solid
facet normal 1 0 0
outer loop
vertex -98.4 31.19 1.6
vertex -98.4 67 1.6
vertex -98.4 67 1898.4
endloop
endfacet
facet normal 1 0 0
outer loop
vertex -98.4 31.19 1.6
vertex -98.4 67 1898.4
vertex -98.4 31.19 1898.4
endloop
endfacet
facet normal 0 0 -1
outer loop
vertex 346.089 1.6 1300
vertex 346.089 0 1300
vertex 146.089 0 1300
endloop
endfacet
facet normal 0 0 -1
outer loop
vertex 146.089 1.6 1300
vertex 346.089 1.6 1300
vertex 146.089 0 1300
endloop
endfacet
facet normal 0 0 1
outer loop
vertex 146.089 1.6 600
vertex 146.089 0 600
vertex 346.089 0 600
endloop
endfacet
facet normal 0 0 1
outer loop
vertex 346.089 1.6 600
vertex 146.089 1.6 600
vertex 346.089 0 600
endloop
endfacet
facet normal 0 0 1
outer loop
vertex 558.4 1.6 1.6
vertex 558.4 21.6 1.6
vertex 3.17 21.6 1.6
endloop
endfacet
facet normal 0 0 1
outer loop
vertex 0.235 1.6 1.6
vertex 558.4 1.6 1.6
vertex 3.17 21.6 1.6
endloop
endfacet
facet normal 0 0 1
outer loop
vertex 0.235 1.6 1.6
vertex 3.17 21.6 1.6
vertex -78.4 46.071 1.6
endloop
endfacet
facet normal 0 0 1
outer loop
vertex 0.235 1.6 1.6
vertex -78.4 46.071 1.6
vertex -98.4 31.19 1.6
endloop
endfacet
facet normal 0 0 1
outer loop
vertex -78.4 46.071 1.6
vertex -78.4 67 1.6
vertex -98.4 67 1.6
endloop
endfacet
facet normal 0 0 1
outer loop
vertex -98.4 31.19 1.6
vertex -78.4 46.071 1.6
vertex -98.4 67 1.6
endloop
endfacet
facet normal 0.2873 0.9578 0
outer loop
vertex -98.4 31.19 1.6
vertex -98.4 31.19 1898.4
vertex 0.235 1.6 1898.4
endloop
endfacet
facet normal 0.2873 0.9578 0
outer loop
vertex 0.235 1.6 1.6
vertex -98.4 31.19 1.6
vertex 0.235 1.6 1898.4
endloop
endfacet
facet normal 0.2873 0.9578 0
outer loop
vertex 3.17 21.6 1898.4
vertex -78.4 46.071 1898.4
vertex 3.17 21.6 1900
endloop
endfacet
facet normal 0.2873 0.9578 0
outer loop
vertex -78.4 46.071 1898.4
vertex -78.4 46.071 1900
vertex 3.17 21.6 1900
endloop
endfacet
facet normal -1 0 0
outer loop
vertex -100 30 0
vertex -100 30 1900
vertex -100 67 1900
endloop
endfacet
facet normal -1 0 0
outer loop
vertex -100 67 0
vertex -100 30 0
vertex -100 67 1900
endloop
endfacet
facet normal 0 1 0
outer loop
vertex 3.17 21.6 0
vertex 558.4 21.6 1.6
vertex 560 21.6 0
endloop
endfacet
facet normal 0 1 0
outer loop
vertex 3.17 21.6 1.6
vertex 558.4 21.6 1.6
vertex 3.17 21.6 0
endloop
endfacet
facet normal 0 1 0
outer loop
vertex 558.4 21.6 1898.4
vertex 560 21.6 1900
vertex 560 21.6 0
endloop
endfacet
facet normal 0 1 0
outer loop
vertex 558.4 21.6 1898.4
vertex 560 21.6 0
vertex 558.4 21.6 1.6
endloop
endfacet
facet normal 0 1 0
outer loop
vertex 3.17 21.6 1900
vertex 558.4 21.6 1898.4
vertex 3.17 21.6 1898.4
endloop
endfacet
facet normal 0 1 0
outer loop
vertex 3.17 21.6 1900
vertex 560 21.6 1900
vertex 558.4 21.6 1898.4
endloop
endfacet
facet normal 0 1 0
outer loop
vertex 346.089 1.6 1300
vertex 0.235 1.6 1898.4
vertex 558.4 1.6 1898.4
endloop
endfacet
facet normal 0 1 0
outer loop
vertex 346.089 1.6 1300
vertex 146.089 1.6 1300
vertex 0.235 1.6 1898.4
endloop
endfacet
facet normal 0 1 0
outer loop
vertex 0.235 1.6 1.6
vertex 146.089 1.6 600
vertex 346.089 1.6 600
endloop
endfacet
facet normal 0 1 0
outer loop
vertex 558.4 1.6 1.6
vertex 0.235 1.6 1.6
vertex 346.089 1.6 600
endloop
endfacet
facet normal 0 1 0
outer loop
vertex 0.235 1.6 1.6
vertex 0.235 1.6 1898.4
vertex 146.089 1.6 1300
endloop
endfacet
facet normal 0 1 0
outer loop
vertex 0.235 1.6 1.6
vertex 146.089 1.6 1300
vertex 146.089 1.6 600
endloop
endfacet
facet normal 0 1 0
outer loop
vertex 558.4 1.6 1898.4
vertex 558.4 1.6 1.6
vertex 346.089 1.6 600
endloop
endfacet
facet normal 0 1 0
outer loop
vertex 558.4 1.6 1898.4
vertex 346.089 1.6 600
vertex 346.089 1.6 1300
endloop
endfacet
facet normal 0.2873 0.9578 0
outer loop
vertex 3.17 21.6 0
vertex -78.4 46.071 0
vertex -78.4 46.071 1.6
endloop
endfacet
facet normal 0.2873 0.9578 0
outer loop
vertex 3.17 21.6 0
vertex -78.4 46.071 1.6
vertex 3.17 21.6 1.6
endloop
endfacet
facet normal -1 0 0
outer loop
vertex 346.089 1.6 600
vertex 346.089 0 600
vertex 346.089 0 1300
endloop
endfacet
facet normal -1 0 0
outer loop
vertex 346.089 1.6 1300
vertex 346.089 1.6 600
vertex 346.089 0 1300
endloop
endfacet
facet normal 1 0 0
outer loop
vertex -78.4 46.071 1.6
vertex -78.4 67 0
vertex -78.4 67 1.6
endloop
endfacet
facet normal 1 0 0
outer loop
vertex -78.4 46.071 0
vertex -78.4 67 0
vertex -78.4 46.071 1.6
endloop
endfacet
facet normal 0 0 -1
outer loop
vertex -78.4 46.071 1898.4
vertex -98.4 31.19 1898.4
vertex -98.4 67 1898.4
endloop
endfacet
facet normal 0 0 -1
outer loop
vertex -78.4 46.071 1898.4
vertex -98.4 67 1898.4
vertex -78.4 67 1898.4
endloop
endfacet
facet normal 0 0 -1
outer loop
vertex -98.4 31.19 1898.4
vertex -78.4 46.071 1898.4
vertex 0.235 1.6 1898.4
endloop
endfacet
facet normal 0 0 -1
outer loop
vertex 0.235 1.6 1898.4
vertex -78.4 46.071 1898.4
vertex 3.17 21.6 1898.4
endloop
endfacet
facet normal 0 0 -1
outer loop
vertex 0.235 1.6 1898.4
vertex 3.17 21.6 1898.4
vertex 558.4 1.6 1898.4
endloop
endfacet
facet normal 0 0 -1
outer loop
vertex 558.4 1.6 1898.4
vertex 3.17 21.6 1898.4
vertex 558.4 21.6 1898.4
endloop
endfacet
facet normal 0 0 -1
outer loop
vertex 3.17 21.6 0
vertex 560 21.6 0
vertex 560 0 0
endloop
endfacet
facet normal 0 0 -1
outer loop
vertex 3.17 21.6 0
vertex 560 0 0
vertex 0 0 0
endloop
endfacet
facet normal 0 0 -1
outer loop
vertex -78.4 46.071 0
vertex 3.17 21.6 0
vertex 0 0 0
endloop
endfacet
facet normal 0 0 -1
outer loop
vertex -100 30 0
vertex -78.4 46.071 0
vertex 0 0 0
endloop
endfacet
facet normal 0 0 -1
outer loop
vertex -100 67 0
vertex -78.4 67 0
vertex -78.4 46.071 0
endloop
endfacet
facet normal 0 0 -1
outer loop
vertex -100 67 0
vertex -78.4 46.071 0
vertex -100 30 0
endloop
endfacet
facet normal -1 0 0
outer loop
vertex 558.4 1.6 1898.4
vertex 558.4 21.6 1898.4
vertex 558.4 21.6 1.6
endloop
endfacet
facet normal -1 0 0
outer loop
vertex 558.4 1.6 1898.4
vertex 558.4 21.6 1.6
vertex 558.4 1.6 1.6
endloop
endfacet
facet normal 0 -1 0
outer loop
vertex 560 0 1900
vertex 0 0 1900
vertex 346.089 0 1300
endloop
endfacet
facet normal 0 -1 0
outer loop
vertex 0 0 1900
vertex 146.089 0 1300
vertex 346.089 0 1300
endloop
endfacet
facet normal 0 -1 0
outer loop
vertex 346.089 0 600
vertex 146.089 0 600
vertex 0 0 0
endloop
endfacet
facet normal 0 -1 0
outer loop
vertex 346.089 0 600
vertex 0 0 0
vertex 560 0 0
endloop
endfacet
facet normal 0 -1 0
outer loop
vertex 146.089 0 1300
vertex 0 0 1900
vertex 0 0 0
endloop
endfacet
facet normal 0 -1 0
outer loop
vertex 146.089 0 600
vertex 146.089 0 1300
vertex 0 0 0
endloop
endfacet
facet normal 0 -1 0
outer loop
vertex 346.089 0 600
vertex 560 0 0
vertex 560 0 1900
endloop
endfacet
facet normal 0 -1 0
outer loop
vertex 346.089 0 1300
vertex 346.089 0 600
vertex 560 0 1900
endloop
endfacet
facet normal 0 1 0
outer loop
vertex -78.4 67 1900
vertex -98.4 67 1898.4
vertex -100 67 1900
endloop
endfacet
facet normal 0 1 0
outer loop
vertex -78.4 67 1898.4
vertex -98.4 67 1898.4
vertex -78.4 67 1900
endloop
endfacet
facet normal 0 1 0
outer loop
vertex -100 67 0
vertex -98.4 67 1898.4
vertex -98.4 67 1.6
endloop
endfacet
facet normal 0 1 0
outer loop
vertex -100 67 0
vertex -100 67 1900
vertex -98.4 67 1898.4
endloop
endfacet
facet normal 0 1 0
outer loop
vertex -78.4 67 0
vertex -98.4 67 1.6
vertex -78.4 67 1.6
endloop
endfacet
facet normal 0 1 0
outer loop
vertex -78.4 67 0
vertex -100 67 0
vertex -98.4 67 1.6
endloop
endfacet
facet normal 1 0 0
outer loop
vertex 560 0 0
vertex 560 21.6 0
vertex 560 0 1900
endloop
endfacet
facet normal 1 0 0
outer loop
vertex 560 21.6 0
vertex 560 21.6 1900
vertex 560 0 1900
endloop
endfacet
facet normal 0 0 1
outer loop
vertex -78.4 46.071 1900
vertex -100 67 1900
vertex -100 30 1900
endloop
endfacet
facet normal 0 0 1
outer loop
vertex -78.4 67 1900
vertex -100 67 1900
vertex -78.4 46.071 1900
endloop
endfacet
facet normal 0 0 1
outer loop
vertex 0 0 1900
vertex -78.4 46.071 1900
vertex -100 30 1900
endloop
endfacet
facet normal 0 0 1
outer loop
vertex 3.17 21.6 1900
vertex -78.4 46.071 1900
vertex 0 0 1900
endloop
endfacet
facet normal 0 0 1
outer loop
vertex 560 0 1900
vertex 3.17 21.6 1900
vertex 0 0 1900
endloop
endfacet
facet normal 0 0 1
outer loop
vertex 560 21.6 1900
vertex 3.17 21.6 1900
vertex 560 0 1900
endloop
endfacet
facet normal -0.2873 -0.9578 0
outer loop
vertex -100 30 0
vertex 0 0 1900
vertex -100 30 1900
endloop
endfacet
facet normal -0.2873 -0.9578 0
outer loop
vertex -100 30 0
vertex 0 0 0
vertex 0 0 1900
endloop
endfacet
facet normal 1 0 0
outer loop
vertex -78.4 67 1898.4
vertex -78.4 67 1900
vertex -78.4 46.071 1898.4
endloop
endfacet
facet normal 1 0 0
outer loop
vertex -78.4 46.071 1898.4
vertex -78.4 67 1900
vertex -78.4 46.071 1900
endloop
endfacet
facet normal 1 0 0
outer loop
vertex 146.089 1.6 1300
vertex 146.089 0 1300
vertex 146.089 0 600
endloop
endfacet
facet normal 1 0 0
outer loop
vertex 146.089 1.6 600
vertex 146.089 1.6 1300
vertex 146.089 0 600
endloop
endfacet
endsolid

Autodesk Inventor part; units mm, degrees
ref_plane "YZ Plane" through (0, 0, 0) normal (1, 0, 0) x (0, 1, 0)
ref_plane "XZ Plane" through (0, 0, 0) normal (0, 1, 0) x (-1, 0, 0)
ref_plane "XY Plane" through (0, 0, 0) normal (0, 0, 1) x (1, 0, 0)
sketch "Sketch1" plane through (0, 0, 0) normal (0, 0, 1) x (1, 0, 0)
  line L0 (0, 0) -> (560, 0)
  line L1 (0, 0) -> (-100, 30)
  line L2 (0, 0) -> (104.4031, 0) construction
  line L3 (-100, 30) -> (-100, 67)
  line L4 (-98.4, 67) -> (-98.4, 31.1904)
  line L5 (-98.4, 31.1904) -> (0.2348, 1.6)
  line L6 (0.2348, 1.6) -> (560, 1.6)
  line L7 (-98.4, 67) -> (-100, 67)
  line L8 (560, 1.6) -> (560, 0)
  dimension "d0" = 560
  dimension "d2" = 100
  dimension "d3" = 37
  dimension "d9" = 30
  dimension "d10" = 1.6
extrude "Extrusion1" add sketch "Sketch1" along normal blind 1900
sketch "Sketch2" plane through (0, 0, 1900) normal (0, 0, 1) x (1, 0, 0)
  line L0 (-98.4, 31.1904) -> (-98.4, 67) projected
  line L1 (0.2348, 1.6) -> (-98.4, 31.1904) projected
  line L2 (560, 1.6) -> (0.2348, 1.6) projected
  line L3 (-78.4, 67) -> (-78.4, 46.0711)
  line L4 (-78.4, 46.0711) -> (3.1702, 21.6)
  line L5 (3.1702, 21.6) -> (560, 21.6)
  line L6 (-78.4, 67) -> (-98.4, 67)
  line L7 (560, 21.6) -> (560, 1.6)
  line L8 (560, 1.6) -> (558.4, 1.6)
  line L9 (558.4, 1.6) -> (558.4, 21.6)
  line L10 (558.4, 21.6) -> (560, 21.6)
  line L11 (560, 21.6) -> (560, 1.6)
  point P0 (0, 0)
  dimension "d11" = 20
  dimension "d16" = 1.6
  dimension "d17" = 20
extrude "Extrusion2" add sketch "Sketch2" against normal blind 1.6
sketch "Sketch3" plane through (0, 0, 0) normal (0, 0, -1) x (-1, 0, 0)
  line L0 (98.4, 67) -> (98.4, 31.1904) projected
  line L1 (98.4, 67) -> (78.4, 67) projected
  line L2 (78.4, 67) -> (78.4, 46.0711) projected
  line L3 (78.4, 46.0711) -> (-3.1702, 21.6) projected
  line L4 (-3.1702, 21.6) -> (-560, 21.6) projected
  line L5 (-560, 21.6) -> (-560, 1.6) projected
  line L6 (-0.2348, 1.6) -> (-560, 1.6) projected
  line L7 (98.4, 31.1904) -> (-0.2348, 1.6) projected
  point P0 (0, 0)
extrude "Extrusion3" add sketch "Sketch3" against normal blind 1.6
sketch "Sketch4" plane through (0, 0, 1898.4) normal (0, 0, -1) x (-1, 0, 0)
  line L0 (-560, 21.6) -> (-560, 1.6) projected
  line L1 (-560, 21.6) -> (-558.4, 21.6)
  line L2 (-558.4, 21.6) -> (-558.4, 1.6)
  line L3 (-558.4, 1.6) -> (-560, 1.6)
  line L4 (-560, 1.6) -> (-560, 21.6)
  point P0 (0, 0)
  dimension "d18" = 1.6
  dimension "d19" = 20
extrude "Extrusion4" add sketch "Sketch4" along normal up to surface (1898.4 mm away)
sketch "Sketch5" plane through (0, 0, 0) normal (0, -1, 0) x (1, 0, 0)
  line L0 (146.0887, 600) -> (346.0887, 600)
  line L1 (346.0887, 600) -> (346.0887, 1300)
  line L2 (346.0887, 1300) -> (146.0887, 1300)
  line L3 (146.0887, 1300) -> (146.0887, 600)
  line L4 (0, 0) -> (560, 0) projected
  dimension "d22" = 200
  dimension "d23" = 700
  dimension "d24" = 600
extrude "Extrusion5" cut sketch "Sketch5" against normal blind 10
properties part number "Cover Lower Front" material "Steel"
